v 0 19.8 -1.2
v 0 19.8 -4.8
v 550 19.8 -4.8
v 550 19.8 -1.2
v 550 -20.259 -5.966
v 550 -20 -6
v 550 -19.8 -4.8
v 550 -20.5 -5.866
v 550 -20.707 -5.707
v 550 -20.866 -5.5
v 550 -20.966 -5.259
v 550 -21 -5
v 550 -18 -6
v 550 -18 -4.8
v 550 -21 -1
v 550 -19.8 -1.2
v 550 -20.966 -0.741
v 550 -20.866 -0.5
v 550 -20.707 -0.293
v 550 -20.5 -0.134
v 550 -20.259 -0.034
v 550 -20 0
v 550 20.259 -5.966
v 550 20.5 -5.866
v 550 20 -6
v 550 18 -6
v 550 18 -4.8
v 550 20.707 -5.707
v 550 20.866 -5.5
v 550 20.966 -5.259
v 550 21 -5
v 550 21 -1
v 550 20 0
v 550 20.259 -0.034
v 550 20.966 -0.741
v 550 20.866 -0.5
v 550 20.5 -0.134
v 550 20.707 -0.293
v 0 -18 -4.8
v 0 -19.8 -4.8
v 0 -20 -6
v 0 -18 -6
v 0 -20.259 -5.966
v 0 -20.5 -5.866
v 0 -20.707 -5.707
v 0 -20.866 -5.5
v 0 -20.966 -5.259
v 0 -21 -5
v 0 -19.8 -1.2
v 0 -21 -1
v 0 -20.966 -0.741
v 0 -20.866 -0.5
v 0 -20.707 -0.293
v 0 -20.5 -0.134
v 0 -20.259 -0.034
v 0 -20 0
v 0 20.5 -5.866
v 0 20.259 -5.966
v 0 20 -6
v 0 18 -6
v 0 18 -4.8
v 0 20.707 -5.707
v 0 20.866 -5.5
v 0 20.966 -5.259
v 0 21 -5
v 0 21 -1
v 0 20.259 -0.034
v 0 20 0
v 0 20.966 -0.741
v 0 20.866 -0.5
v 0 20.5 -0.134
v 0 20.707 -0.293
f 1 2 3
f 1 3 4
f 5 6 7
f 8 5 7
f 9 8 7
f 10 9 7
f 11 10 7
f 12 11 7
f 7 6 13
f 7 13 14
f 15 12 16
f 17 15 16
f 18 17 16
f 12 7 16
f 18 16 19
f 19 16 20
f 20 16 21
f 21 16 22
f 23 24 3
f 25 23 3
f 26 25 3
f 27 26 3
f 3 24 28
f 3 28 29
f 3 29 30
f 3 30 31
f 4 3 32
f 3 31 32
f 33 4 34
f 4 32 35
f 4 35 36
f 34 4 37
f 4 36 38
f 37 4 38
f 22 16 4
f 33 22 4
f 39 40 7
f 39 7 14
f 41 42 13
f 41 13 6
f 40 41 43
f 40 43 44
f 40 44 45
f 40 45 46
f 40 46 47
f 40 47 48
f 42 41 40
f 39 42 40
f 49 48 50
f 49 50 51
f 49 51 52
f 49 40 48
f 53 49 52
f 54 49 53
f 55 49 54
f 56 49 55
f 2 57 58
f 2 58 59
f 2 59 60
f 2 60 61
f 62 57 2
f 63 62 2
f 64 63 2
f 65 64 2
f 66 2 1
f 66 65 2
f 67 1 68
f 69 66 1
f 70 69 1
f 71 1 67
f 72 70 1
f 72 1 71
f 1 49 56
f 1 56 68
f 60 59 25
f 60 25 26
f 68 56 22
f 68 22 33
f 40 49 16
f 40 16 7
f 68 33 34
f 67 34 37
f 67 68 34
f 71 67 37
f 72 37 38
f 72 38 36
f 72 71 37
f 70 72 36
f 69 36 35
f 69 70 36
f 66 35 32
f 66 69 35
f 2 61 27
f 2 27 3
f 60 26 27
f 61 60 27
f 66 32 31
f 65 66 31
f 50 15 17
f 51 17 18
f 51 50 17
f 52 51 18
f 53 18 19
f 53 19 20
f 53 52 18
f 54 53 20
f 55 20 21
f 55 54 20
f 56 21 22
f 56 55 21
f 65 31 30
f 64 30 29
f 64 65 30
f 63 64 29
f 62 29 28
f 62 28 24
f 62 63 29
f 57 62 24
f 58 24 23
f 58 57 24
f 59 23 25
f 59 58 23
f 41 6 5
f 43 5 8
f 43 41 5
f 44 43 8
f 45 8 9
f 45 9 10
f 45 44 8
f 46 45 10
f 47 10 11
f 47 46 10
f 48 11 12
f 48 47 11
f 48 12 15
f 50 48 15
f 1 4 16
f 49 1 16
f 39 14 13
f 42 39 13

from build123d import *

# Parameters (mm, degrees)
EXTRUDE_3_DEPTH = 550


with BuildPart() as part:
    # Эскиз1 → Вытянуть-Тонкостенный3 (new body)
    with BuildSketch(Plane(origin=(0, 0, 0), x_dir=(0, 0, -1), z_dir=(1, 0, 0))):
        with BuildLine():
            Line((6, -18), (6, -20))
            ThreePointArc((6, -20), (5.707106781, -20.707106781), (5, -21))
            Line((5, -21), (1, -21))
            ThreePointArc((1, -21), (0.292893219, -20.707106781), (0, -20))
            Line((0, -20), (0, 20))
            ThreePointArc((0, 20), (0.292893219, 20.707106781), (1, 21))
            Line((1, 21), (5, 21))
            ThreePointArc((5, 21), (5.707106781, 20.707106781), (6, 20))
            Line((6, 20), (6, 18))
            Line((6, 18), (4.8, 18))
            Line((4.8, 18), (4.8, 19.8))
            Line((4.8, 19.8), (1.2, 19.8))
            Line((1.2, 19.8), (1.2, -19.8))
            Line((1.2, -19.8), (4.8, -19.8))
            Line((4.8, -19.8), (4.8, -18))
            Line((4.8, -18), (6, -18))
        make_face()
    extrude(amount=EXTRUDE_3_DEPTH)


solid = part.part
